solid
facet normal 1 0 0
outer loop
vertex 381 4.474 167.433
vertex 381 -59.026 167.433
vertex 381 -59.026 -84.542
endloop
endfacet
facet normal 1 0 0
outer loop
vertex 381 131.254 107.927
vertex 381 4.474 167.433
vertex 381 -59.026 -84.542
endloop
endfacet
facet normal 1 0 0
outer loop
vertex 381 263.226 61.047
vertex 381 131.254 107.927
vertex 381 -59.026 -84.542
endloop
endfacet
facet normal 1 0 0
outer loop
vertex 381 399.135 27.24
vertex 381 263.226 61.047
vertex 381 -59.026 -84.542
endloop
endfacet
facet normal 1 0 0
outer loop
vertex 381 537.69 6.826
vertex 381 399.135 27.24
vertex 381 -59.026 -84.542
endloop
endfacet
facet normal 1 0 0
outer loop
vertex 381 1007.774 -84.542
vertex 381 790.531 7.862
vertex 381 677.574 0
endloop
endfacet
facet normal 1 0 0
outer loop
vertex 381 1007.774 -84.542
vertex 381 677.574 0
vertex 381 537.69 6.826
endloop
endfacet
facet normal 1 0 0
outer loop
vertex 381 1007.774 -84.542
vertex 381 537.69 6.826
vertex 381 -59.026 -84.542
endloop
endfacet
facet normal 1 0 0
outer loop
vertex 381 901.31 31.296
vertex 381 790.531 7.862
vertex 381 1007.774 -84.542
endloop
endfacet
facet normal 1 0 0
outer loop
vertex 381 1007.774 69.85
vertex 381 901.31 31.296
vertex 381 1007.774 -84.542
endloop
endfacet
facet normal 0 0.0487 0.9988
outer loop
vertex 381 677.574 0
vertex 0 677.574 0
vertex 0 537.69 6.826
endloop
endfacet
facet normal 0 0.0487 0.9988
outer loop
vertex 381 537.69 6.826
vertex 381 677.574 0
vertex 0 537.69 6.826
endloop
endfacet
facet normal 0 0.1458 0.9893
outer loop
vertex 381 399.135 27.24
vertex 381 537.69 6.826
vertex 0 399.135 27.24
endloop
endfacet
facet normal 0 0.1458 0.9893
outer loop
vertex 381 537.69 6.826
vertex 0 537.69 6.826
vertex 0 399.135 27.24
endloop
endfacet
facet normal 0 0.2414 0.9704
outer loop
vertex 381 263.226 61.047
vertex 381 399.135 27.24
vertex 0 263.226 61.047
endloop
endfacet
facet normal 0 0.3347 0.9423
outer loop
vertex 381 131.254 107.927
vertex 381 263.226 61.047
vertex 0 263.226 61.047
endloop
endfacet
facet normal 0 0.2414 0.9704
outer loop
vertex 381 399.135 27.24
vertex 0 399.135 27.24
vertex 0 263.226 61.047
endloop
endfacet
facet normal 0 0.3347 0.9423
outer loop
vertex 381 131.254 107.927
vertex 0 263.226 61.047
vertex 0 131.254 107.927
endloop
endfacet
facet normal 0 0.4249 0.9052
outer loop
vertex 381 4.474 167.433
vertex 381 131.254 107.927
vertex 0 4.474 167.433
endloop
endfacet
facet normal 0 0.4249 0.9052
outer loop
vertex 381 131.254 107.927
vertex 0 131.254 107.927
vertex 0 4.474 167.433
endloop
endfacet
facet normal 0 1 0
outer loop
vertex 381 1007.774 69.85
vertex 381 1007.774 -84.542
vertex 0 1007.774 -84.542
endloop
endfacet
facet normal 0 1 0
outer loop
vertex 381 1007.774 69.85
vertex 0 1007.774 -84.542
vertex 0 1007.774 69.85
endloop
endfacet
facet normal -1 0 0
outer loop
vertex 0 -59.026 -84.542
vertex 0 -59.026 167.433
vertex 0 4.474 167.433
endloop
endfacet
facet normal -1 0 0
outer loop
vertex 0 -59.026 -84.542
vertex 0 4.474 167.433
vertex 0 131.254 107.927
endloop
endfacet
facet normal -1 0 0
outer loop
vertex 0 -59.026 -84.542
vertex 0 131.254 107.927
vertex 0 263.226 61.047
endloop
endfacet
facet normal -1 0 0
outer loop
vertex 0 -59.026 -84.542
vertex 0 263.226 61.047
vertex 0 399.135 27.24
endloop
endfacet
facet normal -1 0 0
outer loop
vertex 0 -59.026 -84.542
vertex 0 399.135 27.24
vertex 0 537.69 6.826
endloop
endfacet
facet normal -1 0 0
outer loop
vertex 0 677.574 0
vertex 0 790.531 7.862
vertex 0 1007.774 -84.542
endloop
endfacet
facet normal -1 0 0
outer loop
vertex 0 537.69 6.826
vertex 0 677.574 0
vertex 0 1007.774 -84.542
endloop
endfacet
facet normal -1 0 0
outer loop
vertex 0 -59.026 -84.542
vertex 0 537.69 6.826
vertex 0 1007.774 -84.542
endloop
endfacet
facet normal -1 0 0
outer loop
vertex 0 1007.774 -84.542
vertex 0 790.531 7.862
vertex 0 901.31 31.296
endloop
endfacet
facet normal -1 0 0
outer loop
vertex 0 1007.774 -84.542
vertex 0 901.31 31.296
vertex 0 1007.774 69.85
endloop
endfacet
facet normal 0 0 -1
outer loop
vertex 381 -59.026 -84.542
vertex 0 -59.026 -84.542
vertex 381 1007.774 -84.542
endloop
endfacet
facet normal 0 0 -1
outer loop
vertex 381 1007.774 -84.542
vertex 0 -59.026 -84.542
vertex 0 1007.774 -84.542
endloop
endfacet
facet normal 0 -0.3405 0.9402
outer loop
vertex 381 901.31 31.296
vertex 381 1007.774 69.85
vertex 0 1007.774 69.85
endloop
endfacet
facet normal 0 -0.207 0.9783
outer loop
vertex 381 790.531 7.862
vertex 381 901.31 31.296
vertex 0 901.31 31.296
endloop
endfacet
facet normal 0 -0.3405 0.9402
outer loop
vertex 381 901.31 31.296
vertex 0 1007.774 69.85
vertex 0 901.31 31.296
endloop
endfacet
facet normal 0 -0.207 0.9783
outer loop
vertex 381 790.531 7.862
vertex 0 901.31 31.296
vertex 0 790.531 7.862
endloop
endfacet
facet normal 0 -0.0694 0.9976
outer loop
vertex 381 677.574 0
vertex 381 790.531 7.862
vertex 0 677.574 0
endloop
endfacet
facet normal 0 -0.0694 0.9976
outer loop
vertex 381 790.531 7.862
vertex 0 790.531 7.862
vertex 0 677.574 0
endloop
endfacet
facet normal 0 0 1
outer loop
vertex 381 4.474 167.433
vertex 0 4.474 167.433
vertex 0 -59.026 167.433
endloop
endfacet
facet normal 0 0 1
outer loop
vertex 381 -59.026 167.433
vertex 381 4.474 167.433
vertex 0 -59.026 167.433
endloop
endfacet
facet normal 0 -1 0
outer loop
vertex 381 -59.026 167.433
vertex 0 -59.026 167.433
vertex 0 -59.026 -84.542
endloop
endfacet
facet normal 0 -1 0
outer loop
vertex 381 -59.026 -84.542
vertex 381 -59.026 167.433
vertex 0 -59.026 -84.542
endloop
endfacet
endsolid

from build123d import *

# Parameters (mm, degrees)
F1_DEPTH = 381


with BuildPart() as f1:
    # F0 (on Right) → F1 (new body)
    with BuildSketch(Plane.YZ):
        with BuildLine():
            Line((4.474148, 167.432852), (-59.025852, 167.432852))
            Line((-59.025852, 167.432852), (-59.025852, 0))
            Line((-59.025852, 0), (-59.025852, -84.542013))
            Line((-59.025852, -84.542013), (1007.774148, -84.542013))
            Line((1007.774148, -84.542013), (1007.774148, 0))
            Line((1007.774148, 0), (1007.774148, 69.85))
            ThreePointArc((1007.774148, 69.85), (846.327713, 17.653603), (677.574148, 0))
            ThreePointArc((677.574148, 0), (330.768233, 42.486428), (4.474148, 167.432852))
        make_face()
    extrude(amount=F1_DEPTH)


solid = f1.part
